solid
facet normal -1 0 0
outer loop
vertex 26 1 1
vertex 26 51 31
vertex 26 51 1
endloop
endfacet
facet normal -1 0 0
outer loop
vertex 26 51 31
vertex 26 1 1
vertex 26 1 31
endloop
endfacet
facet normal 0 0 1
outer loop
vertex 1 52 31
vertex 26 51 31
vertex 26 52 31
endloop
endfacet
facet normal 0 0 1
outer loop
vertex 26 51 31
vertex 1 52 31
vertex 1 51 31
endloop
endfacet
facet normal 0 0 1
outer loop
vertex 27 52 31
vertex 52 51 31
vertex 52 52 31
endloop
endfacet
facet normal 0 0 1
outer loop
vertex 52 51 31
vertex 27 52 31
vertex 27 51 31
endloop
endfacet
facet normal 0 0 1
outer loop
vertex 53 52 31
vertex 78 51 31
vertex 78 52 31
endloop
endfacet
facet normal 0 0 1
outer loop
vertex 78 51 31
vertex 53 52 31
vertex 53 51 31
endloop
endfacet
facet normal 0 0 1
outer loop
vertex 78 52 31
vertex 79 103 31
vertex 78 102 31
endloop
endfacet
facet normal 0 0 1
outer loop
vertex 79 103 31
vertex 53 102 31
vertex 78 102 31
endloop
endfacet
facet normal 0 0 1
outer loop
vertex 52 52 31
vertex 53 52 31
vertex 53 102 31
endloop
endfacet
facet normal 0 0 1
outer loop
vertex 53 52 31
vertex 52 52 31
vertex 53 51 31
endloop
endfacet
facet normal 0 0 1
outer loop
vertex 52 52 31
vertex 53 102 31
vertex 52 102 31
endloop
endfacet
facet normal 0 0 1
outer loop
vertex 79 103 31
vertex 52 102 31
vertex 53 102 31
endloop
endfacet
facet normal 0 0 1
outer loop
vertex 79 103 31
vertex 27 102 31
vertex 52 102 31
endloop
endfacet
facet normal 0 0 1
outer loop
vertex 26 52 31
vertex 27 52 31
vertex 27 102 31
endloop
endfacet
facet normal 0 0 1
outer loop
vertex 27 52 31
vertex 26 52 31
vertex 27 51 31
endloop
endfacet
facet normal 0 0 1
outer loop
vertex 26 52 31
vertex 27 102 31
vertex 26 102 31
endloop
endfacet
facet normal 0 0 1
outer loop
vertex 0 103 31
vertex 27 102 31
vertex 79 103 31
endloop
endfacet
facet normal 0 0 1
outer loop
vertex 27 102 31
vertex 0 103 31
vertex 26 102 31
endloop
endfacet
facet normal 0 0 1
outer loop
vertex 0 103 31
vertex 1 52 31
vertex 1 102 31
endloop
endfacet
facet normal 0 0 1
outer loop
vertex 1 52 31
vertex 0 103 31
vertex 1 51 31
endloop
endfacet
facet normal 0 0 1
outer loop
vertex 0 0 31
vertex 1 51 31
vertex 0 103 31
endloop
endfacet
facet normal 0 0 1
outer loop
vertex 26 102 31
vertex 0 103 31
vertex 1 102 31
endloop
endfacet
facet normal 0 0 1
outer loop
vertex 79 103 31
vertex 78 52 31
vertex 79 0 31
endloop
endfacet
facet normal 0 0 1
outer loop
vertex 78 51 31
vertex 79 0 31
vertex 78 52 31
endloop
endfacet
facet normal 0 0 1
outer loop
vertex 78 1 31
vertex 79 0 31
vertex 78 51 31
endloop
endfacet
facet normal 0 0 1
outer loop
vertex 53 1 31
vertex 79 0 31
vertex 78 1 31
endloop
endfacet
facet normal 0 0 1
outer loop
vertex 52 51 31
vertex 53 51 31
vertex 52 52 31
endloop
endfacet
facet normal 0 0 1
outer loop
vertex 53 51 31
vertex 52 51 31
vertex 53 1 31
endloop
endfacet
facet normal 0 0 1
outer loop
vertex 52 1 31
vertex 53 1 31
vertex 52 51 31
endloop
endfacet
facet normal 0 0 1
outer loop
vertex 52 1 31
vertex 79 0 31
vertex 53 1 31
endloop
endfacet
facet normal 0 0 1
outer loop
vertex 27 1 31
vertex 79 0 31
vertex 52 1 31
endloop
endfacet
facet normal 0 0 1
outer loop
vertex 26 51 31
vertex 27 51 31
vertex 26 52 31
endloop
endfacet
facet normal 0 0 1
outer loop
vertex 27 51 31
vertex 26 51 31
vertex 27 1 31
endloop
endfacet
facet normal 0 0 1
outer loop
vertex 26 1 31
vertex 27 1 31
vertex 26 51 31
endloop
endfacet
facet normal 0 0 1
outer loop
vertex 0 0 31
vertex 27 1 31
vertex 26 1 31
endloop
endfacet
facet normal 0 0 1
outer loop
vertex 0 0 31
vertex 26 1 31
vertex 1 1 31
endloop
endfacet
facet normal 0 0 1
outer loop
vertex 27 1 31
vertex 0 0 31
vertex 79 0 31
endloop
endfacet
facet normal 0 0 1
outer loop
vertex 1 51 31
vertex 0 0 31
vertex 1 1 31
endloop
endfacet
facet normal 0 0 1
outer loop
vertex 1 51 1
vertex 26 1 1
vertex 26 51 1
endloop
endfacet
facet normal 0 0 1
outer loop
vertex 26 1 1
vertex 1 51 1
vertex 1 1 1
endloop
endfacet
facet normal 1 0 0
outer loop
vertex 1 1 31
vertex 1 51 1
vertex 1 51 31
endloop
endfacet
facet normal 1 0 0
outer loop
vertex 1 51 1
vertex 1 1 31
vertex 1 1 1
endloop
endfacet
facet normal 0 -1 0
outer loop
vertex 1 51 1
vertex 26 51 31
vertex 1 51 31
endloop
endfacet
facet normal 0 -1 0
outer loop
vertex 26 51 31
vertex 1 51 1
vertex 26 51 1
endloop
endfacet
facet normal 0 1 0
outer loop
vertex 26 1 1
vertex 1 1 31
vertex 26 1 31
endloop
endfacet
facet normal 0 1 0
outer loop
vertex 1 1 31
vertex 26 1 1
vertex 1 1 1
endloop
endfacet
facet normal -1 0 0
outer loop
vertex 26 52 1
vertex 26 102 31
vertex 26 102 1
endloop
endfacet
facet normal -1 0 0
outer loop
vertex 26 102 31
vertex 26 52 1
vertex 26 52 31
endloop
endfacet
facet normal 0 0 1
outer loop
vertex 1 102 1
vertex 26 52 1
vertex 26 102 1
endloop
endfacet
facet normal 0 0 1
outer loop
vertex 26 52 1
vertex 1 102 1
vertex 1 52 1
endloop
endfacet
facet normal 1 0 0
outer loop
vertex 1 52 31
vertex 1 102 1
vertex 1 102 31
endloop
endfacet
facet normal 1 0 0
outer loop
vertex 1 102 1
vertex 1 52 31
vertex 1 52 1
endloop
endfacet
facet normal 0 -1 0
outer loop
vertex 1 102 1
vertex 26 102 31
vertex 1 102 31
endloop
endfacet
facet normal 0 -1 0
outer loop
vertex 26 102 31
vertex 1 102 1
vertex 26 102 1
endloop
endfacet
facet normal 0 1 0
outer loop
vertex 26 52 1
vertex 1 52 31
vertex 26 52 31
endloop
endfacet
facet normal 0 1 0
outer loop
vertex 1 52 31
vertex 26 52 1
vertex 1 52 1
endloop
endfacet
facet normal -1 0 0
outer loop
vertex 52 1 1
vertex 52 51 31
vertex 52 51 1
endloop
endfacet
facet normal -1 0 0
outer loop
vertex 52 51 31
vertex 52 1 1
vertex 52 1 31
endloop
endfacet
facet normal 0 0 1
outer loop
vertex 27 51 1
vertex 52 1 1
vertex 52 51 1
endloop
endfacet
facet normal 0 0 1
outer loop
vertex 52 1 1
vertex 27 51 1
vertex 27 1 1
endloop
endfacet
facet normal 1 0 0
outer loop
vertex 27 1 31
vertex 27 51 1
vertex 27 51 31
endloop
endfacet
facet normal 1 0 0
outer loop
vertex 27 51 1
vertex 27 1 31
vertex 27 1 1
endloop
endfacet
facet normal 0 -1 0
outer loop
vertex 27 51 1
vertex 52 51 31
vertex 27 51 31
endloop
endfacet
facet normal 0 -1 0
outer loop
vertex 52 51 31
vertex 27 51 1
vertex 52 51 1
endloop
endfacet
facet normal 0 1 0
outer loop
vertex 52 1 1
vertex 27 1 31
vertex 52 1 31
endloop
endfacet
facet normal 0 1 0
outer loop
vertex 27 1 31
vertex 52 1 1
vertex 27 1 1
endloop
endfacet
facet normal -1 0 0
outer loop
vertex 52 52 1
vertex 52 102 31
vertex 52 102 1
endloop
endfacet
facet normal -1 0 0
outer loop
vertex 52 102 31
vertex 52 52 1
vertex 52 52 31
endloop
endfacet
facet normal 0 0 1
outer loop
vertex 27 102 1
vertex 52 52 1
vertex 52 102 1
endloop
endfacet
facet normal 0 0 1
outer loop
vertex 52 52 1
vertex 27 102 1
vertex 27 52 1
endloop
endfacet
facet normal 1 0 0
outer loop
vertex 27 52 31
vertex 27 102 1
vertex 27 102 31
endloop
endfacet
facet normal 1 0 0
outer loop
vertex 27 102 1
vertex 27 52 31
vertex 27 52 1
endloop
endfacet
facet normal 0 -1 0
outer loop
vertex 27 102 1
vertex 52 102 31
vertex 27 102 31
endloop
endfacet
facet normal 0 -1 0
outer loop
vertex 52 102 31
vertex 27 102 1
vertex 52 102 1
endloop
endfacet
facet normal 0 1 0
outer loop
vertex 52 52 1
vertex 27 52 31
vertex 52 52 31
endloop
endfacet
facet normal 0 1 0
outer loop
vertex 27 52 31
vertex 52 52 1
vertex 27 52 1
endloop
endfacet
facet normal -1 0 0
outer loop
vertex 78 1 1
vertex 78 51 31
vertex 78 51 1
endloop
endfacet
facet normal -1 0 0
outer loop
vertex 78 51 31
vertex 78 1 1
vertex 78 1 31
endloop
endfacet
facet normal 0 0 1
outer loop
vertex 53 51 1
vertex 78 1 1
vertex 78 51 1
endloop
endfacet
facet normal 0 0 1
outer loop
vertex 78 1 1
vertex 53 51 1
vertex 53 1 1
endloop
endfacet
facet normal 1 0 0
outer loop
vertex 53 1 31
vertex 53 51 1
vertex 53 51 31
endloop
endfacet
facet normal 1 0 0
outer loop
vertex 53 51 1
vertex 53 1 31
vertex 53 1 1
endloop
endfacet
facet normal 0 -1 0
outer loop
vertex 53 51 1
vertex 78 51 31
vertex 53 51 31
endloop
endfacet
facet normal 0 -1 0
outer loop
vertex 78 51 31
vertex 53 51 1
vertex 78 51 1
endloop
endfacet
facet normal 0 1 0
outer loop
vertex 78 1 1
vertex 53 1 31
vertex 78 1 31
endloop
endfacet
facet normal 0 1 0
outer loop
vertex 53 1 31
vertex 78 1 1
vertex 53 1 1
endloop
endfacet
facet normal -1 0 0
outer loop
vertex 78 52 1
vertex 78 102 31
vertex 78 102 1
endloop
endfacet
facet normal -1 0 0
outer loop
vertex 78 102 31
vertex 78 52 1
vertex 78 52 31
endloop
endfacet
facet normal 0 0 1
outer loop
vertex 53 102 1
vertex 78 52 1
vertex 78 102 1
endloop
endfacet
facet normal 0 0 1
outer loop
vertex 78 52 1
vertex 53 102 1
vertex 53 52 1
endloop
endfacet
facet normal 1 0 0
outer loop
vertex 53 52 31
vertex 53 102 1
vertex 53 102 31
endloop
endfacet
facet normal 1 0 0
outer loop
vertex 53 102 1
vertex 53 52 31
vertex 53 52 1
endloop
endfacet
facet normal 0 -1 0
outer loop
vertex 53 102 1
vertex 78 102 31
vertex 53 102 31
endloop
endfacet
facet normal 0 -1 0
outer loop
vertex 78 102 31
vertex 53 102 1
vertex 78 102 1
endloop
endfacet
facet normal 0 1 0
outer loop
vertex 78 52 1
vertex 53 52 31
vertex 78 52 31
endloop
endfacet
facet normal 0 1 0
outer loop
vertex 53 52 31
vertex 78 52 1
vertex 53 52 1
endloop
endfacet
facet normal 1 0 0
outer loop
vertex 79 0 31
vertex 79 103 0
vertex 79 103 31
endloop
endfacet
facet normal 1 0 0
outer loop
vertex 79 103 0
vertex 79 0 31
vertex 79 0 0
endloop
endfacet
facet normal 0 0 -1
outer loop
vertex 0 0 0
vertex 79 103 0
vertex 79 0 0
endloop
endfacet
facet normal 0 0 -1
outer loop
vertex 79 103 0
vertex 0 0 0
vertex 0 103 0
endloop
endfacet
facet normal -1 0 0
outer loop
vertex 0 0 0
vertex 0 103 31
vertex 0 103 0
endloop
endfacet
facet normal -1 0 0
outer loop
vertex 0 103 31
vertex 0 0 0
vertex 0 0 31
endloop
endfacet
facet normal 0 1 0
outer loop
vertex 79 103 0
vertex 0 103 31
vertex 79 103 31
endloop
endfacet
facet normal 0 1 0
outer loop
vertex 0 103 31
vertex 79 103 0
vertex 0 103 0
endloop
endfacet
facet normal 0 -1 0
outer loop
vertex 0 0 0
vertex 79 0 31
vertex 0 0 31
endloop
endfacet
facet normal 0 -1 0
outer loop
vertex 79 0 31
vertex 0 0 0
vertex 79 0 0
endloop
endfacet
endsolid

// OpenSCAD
$fs=0.25;$fa=6;
difference(){translate([39.5,51.5,15.5])cube([79,103,31],center=true);
union() {
translate([1,1,1])translate([12.5,25,15])cube([25,50,30],center=true);
translate([1,52,1])translate([12.5,25,15])cube([25,50,30],center=true);
translate([27,1,1])translate([12.5,25,15])cube([25,50,30],center=true);
translate([27,52,1])translate([12.5,25,15])cube([25,50,30],center=true);
translate([53,1,1])translate([12.5,25,15])cube([25,50,30],center=true);
translate([53,52,1])translate([12.5,25,15])cube([25,50,30],center=true);
}
}
